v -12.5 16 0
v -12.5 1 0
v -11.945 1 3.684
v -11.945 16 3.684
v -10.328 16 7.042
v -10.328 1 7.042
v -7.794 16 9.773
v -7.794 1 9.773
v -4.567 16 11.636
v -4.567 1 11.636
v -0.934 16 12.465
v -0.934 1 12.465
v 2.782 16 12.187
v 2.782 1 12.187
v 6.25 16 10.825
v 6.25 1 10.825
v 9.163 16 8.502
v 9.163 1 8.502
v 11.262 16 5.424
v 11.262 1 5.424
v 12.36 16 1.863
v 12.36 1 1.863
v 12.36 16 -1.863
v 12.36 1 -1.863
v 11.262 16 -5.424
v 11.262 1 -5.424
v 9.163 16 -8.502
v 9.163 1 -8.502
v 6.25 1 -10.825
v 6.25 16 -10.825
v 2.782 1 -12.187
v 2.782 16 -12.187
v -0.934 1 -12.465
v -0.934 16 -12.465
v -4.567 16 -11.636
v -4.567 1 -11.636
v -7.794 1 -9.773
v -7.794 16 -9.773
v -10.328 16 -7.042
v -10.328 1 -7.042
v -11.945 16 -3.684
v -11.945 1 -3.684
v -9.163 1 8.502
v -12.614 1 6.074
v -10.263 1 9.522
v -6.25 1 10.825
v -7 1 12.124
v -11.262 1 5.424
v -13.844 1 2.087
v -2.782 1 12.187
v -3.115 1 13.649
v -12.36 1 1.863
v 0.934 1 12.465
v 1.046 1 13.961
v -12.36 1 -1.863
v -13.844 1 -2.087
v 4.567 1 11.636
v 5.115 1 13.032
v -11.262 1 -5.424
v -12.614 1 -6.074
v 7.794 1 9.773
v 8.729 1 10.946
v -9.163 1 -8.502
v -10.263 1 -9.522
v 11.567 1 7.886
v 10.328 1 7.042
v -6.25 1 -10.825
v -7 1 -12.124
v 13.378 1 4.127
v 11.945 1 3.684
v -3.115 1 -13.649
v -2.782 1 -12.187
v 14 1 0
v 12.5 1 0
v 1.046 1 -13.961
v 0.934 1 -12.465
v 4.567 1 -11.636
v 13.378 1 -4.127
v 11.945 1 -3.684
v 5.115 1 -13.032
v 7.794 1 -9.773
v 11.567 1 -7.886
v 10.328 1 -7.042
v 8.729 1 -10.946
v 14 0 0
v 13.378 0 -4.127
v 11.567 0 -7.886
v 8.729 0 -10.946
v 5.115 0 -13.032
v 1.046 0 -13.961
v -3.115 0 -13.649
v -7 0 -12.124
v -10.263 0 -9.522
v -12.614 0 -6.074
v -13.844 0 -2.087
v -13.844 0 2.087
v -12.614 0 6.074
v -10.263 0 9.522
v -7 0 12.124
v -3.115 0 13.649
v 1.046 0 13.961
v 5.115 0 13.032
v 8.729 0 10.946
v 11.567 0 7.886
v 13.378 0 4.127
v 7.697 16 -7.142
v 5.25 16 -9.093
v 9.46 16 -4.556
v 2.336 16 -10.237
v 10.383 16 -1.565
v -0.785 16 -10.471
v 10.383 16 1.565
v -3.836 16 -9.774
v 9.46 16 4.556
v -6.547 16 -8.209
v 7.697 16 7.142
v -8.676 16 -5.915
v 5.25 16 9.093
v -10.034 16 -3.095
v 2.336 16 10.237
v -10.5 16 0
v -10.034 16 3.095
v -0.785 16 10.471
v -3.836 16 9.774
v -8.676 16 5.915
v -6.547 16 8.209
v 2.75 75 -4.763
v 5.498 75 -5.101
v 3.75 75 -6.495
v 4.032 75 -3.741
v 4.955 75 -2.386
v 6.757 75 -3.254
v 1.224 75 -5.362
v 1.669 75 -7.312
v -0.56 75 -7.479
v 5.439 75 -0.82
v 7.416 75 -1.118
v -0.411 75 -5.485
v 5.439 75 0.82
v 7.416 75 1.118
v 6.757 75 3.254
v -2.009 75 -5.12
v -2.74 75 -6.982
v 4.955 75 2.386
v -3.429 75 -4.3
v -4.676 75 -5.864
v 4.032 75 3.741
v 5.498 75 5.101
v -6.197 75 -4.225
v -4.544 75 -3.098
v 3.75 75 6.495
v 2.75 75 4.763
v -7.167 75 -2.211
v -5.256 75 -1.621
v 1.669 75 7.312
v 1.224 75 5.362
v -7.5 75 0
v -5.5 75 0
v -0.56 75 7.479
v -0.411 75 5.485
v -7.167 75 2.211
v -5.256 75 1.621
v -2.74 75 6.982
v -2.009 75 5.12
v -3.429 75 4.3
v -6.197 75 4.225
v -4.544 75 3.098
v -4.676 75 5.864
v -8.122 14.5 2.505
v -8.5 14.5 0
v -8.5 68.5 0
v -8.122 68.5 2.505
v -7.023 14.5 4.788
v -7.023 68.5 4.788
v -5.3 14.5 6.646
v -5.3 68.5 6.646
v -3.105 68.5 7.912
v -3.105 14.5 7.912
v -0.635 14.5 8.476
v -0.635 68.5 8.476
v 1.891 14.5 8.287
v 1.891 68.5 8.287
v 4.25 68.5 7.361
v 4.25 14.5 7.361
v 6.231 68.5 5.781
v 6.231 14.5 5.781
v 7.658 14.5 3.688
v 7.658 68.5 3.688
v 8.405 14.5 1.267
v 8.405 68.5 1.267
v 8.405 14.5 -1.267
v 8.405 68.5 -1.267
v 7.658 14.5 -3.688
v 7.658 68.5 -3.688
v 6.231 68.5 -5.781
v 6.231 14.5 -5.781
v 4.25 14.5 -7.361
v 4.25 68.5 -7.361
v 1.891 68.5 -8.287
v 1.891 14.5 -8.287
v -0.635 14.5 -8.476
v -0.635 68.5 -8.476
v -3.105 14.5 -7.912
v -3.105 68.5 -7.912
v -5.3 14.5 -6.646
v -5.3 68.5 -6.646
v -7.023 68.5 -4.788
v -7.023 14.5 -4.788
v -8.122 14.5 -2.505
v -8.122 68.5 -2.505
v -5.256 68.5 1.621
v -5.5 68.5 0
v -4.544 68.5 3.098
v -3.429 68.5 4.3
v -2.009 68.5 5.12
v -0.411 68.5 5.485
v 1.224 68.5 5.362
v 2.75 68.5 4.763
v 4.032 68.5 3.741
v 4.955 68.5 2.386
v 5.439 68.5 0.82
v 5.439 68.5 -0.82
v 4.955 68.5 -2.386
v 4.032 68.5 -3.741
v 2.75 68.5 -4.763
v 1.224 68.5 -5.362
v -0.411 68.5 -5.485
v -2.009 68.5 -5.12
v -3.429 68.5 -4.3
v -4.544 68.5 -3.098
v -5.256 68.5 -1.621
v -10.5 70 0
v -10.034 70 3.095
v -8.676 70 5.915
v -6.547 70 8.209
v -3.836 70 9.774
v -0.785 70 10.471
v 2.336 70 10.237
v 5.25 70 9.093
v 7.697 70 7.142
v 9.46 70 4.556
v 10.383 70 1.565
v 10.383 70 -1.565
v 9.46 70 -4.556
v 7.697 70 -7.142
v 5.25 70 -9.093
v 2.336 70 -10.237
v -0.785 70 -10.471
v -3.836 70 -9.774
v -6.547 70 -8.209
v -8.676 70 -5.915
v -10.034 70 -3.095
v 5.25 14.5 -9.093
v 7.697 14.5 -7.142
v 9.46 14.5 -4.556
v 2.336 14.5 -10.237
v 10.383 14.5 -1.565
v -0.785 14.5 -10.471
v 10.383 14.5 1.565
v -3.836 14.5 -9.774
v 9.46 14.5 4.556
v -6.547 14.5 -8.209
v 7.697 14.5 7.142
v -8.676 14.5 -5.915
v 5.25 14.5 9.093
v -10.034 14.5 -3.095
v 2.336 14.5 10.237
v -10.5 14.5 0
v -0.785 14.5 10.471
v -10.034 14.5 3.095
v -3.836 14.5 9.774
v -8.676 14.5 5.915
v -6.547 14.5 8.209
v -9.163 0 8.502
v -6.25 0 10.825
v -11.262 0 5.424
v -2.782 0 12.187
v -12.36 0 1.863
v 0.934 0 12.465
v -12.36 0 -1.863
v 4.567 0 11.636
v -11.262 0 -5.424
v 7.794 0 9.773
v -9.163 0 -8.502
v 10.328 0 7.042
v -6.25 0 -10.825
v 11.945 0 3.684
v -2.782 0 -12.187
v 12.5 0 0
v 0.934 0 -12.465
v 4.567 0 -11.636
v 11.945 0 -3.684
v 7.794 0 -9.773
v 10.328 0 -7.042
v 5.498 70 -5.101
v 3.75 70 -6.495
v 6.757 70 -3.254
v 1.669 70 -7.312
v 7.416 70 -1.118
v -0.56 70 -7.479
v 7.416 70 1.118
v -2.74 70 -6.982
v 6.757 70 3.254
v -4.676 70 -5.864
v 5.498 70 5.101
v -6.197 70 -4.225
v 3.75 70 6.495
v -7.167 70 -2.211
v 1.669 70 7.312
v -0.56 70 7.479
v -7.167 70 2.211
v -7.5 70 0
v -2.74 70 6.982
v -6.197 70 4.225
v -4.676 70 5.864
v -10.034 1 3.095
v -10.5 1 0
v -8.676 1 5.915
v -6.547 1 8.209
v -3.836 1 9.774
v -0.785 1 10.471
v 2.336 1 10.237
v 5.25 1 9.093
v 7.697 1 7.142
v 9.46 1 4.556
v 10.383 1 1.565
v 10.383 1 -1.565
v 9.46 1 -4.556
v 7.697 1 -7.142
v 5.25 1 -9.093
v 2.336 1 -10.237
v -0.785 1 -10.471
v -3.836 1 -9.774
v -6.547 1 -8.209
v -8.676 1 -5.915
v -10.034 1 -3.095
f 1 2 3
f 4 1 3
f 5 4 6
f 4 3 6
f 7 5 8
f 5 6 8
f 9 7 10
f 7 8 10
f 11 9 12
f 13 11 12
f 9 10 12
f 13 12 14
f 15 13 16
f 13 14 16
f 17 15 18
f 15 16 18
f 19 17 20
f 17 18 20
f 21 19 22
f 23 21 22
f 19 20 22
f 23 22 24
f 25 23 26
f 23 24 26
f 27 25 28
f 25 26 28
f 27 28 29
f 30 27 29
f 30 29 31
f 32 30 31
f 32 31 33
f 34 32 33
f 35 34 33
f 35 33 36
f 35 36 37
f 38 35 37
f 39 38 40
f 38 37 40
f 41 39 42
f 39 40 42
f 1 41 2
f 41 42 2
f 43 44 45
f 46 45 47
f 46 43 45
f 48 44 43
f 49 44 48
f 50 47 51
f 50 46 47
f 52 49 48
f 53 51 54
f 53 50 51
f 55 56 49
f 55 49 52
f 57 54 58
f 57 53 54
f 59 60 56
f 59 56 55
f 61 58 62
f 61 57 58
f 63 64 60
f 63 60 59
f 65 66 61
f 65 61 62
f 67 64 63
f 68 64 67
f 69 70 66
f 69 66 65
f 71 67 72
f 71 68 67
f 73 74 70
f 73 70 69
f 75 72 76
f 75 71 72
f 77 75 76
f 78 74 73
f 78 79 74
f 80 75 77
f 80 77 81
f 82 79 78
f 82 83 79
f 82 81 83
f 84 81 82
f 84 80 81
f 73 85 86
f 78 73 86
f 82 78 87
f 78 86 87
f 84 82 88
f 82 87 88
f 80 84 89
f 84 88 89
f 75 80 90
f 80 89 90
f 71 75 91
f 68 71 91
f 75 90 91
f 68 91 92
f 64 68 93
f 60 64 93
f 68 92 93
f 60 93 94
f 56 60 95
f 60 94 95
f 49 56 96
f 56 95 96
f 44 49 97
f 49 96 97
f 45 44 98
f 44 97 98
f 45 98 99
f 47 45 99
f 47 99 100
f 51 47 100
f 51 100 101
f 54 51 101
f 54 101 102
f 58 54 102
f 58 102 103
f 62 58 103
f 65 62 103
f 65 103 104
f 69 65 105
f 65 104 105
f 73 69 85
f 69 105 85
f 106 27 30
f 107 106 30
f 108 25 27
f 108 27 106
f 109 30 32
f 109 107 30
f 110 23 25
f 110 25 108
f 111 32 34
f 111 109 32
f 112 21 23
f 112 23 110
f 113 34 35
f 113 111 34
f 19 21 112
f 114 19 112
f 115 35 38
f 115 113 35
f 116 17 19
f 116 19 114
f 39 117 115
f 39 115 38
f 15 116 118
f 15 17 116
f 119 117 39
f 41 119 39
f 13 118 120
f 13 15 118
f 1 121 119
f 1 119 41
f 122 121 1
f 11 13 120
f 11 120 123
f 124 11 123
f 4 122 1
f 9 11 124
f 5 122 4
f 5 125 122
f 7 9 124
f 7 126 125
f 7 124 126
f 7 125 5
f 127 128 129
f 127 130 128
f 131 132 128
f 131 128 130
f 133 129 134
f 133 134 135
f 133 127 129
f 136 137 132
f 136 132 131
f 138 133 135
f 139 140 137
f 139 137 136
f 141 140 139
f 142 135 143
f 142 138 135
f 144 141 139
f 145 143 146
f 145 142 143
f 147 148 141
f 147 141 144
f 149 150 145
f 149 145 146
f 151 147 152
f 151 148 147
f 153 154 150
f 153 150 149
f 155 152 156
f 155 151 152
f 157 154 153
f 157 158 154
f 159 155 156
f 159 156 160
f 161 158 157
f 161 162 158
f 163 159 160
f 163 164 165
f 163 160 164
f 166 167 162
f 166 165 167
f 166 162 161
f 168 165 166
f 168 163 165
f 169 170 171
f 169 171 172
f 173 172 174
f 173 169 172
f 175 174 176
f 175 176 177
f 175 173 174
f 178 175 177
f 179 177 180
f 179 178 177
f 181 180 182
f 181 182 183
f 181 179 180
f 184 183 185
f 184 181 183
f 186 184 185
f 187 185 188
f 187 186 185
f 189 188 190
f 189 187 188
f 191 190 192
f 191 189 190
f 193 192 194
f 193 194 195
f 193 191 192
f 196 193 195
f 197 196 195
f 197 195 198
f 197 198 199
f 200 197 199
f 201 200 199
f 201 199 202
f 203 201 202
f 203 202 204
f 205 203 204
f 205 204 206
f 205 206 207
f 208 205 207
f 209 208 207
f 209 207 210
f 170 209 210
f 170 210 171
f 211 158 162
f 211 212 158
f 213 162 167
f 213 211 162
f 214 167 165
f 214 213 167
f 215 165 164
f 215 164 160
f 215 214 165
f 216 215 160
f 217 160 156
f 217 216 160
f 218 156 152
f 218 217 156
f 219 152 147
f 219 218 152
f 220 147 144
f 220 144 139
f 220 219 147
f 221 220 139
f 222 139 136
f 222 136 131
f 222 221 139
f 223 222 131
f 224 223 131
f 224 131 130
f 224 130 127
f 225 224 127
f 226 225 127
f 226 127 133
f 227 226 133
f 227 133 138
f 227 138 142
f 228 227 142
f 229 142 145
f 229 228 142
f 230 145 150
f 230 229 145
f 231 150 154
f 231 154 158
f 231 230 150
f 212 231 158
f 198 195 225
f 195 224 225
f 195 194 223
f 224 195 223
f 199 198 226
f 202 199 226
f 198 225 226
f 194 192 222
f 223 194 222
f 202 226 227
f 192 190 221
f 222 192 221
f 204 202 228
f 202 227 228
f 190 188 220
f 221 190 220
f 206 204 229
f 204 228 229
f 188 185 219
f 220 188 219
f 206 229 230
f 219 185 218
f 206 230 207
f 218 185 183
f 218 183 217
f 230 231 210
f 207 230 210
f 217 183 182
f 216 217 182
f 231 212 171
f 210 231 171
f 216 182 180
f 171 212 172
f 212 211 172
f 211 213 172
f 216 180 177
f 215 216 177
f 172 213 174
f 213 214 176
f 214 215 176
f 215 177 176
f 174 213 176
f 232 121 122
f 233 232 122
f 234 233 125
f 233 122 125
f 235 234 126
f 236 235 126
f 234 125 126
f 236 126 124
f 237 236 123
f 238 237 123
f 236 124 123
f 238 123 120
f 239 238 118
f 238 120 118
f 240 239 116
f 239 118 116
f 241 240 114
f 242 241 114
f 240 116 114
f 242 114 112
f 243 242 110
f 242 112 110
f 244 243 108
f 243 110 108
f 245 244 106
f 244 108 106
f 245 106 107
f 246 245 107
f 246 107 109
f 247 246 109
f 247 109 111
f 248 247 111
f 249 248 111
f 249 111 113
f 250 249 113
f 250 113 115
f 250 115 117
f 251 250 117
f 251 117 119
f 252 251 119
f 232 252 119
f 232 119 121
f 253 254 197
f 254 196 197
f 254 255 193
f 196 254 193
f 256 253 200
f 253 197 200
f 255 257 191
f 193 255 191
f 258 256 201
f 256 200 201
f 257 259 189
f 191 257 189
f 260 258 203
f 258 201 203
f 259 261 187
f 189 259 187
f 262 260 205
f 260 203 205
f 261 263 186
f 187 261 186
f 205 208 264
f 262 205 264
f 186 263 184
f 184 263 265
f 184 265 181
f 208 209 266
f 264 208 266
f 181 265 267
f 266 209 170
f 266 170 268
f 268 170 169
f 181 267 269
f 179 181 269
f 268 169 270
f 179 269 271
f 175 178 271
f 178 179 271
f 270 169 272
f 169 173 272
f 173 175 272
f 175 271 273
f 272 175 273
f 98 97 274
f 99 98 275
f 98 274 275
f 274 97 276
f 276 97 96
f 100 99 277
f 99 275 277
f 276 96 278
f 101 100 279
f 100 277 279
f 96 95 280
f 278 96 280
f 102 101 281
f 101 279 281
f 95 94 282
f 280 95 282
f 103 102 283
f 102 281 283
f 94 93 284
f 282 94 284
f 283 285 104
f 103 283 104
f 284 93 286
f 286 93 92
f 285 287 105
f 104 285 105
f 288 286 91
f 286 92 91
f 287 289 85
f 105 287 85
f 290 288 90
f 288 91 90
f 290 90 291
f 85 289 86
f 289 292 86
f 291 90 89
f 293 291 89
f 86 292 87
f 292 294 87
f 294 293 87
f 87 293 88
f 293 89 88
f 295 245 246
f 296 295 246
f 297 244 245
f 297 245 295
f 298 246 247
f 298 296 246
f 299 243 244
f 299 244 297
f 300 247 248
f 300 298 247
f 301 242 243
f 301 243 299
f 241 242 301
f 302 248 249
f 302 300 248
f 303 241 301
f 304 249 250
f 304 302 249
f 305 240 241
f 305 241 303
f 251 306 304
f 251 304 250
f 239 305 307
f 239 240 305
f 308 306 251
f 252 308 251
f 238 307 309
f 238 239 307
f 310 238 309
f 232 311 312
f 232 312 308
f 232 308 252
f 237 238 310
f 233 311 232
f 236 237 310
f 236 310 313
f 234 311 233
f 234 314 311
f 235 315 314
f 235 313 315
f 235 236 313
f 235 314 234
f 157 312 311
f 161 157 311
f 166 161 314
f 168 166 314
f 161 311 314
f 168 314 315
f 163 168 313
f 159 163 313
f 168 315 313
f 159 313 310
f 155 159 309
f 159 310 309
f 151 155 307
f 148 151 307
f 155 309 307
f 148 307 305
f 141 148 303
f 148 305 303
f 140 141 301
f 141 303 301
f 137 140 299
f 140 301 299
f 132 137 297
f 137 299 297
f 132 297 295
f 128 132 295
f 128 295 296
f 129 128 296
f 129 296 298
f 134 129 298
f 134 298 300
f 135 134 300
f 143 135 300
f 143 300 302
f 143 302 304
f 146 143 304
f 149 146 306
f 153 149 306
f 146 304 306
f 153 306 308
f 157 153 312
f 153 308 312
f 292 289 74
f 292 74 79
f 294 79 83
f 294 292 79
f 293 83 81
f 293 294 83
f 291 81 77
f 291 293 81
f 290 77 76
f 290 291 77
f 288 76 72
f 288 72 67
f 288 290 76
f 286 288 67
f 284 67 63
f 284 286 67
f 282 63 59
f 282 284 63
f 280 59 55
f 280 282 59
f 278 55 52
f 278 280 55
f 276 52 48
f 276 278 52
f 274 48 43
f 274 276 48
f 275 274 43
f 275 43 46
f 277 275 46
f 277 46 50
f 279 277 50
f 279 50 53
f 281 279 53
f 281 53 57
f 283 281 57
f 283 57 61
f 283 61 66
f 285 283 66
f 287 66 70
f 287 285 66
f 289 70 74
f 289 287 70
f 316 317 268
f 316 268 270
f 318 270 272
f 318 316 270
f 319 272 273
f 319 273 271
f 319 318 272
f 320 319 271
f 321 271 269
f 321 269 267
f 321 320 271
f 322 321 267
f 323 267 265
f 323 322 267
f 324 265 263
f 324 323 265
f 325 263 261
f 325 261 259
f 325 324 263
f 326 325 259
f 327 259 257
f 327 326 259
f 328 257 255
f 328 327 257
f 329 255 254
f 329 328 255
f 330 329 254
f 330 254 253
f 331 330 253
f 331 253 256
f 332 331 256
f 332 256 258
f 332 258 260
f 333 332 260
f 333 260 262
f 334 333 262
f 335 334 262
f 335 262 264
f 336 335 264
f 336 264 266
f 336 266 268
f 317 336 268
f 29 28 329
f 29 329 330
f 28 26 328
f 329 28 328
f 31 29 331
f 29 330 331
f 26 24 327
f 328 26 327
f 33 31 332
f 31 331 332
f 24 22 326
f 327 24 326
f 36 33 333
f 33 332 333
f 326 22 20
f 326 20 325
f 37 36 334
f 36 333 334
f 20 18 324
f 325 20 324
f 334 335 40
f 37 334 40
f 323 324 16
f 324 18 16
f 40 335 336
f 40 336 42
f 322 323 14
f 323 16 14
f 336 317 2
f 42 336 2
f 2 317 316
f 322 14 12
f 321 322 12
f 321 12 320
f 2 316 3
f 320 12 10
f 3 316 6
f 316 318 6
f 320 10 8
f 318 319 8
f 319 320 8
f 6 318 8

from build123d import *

# Parameters (mm, degrees)
SKETCH1_R      = 14
SKETCH1_R_2    = 12.5
EXTRUDE1_DEPTH = 1
SKETCH2_R      = 12.5
SKETCH2_R_2    = 10.5
EXTRUDE2_DEPTH = 15
SKETCH4_R      = 10.5
SKETCH4_R_2    = 8.5
EXTRUDE3_DEPTH = 55.5
SKETCH7_R      = 8.5
SKETCH7_R_2    = 5.5
EXTRUDE6_DEPTH = 1.5
SKETCH8_R      = 7.5
SKETCH8_R_2    = 5.5
EXTRUDE7_DEPTH = 5


with BuildPart() as part:
    # Sketch1 → Extrude1 (new body)
    with BuildSketch(Plane(origin=(0, 0, 0), x_dir=(1, 0, 0), z_dir=(0, 1, 0))):
        Circle(SKETCH1_R)
        Circle(SKETCH1_R_2, mode=Mode.SUBTRACT)
    extrude(amount=EXTRUDE1_DEPTH)


with BuildPart() as body_2:
    # Sketch2 → Extrude2 (new body)
    with BuildSketch(Plane(origin=(0, 1, 0), x_dir=(-1, 0, 0), z_dir=(0, 1, 0))):
        Circle(SKETCH2_R)
        Circle(SKETCH2_R_2, mode=Mode.SUBTRACT)
    extrude(amount=EXTRUDE2_DEPTH)

    # Sketch4 → Extrude3 (add)
    with BuildSketch(Plane(origin=(0, 14.5, 0), x_dir=(-1, 0, 0), z_dir=(0, 1, 0))):
        Circle(SKETCH4_R)
        Circle(SKETCH4_R_2, mode=Mode.SUBTRACT)
    extrude(amount=EXTRUDE3_DEPTH)

    # Sketch7 → Extrude6 (add)
    with BuildSketch(Plane(origin=(0, 68.5, 0), x_dir=(-1, 0, 0), z_dir=(0, 1, 0))):
        Circle(SKETCH7_R)
        Circle(SKETCH7_R_2, mode=Mode.SUBTRACT)
    extrude(amount=EXTRUDE6_DEPTH)

    # Sketch8 → Extrude7 (add)
    with BuildSketch(Plane(origin=(0, 70, 0), x_dir=(-1, 0, 0), z_dir=(0, 1, 0))):
        Circle(SKETCH8_R)
        Circle(SKETCH8_R_2, mode=Mode.SUBTRACT)
    extrude(amount=EXTRUDE7_DEPTH)


solid = Compound([part.part, body_2.part])
